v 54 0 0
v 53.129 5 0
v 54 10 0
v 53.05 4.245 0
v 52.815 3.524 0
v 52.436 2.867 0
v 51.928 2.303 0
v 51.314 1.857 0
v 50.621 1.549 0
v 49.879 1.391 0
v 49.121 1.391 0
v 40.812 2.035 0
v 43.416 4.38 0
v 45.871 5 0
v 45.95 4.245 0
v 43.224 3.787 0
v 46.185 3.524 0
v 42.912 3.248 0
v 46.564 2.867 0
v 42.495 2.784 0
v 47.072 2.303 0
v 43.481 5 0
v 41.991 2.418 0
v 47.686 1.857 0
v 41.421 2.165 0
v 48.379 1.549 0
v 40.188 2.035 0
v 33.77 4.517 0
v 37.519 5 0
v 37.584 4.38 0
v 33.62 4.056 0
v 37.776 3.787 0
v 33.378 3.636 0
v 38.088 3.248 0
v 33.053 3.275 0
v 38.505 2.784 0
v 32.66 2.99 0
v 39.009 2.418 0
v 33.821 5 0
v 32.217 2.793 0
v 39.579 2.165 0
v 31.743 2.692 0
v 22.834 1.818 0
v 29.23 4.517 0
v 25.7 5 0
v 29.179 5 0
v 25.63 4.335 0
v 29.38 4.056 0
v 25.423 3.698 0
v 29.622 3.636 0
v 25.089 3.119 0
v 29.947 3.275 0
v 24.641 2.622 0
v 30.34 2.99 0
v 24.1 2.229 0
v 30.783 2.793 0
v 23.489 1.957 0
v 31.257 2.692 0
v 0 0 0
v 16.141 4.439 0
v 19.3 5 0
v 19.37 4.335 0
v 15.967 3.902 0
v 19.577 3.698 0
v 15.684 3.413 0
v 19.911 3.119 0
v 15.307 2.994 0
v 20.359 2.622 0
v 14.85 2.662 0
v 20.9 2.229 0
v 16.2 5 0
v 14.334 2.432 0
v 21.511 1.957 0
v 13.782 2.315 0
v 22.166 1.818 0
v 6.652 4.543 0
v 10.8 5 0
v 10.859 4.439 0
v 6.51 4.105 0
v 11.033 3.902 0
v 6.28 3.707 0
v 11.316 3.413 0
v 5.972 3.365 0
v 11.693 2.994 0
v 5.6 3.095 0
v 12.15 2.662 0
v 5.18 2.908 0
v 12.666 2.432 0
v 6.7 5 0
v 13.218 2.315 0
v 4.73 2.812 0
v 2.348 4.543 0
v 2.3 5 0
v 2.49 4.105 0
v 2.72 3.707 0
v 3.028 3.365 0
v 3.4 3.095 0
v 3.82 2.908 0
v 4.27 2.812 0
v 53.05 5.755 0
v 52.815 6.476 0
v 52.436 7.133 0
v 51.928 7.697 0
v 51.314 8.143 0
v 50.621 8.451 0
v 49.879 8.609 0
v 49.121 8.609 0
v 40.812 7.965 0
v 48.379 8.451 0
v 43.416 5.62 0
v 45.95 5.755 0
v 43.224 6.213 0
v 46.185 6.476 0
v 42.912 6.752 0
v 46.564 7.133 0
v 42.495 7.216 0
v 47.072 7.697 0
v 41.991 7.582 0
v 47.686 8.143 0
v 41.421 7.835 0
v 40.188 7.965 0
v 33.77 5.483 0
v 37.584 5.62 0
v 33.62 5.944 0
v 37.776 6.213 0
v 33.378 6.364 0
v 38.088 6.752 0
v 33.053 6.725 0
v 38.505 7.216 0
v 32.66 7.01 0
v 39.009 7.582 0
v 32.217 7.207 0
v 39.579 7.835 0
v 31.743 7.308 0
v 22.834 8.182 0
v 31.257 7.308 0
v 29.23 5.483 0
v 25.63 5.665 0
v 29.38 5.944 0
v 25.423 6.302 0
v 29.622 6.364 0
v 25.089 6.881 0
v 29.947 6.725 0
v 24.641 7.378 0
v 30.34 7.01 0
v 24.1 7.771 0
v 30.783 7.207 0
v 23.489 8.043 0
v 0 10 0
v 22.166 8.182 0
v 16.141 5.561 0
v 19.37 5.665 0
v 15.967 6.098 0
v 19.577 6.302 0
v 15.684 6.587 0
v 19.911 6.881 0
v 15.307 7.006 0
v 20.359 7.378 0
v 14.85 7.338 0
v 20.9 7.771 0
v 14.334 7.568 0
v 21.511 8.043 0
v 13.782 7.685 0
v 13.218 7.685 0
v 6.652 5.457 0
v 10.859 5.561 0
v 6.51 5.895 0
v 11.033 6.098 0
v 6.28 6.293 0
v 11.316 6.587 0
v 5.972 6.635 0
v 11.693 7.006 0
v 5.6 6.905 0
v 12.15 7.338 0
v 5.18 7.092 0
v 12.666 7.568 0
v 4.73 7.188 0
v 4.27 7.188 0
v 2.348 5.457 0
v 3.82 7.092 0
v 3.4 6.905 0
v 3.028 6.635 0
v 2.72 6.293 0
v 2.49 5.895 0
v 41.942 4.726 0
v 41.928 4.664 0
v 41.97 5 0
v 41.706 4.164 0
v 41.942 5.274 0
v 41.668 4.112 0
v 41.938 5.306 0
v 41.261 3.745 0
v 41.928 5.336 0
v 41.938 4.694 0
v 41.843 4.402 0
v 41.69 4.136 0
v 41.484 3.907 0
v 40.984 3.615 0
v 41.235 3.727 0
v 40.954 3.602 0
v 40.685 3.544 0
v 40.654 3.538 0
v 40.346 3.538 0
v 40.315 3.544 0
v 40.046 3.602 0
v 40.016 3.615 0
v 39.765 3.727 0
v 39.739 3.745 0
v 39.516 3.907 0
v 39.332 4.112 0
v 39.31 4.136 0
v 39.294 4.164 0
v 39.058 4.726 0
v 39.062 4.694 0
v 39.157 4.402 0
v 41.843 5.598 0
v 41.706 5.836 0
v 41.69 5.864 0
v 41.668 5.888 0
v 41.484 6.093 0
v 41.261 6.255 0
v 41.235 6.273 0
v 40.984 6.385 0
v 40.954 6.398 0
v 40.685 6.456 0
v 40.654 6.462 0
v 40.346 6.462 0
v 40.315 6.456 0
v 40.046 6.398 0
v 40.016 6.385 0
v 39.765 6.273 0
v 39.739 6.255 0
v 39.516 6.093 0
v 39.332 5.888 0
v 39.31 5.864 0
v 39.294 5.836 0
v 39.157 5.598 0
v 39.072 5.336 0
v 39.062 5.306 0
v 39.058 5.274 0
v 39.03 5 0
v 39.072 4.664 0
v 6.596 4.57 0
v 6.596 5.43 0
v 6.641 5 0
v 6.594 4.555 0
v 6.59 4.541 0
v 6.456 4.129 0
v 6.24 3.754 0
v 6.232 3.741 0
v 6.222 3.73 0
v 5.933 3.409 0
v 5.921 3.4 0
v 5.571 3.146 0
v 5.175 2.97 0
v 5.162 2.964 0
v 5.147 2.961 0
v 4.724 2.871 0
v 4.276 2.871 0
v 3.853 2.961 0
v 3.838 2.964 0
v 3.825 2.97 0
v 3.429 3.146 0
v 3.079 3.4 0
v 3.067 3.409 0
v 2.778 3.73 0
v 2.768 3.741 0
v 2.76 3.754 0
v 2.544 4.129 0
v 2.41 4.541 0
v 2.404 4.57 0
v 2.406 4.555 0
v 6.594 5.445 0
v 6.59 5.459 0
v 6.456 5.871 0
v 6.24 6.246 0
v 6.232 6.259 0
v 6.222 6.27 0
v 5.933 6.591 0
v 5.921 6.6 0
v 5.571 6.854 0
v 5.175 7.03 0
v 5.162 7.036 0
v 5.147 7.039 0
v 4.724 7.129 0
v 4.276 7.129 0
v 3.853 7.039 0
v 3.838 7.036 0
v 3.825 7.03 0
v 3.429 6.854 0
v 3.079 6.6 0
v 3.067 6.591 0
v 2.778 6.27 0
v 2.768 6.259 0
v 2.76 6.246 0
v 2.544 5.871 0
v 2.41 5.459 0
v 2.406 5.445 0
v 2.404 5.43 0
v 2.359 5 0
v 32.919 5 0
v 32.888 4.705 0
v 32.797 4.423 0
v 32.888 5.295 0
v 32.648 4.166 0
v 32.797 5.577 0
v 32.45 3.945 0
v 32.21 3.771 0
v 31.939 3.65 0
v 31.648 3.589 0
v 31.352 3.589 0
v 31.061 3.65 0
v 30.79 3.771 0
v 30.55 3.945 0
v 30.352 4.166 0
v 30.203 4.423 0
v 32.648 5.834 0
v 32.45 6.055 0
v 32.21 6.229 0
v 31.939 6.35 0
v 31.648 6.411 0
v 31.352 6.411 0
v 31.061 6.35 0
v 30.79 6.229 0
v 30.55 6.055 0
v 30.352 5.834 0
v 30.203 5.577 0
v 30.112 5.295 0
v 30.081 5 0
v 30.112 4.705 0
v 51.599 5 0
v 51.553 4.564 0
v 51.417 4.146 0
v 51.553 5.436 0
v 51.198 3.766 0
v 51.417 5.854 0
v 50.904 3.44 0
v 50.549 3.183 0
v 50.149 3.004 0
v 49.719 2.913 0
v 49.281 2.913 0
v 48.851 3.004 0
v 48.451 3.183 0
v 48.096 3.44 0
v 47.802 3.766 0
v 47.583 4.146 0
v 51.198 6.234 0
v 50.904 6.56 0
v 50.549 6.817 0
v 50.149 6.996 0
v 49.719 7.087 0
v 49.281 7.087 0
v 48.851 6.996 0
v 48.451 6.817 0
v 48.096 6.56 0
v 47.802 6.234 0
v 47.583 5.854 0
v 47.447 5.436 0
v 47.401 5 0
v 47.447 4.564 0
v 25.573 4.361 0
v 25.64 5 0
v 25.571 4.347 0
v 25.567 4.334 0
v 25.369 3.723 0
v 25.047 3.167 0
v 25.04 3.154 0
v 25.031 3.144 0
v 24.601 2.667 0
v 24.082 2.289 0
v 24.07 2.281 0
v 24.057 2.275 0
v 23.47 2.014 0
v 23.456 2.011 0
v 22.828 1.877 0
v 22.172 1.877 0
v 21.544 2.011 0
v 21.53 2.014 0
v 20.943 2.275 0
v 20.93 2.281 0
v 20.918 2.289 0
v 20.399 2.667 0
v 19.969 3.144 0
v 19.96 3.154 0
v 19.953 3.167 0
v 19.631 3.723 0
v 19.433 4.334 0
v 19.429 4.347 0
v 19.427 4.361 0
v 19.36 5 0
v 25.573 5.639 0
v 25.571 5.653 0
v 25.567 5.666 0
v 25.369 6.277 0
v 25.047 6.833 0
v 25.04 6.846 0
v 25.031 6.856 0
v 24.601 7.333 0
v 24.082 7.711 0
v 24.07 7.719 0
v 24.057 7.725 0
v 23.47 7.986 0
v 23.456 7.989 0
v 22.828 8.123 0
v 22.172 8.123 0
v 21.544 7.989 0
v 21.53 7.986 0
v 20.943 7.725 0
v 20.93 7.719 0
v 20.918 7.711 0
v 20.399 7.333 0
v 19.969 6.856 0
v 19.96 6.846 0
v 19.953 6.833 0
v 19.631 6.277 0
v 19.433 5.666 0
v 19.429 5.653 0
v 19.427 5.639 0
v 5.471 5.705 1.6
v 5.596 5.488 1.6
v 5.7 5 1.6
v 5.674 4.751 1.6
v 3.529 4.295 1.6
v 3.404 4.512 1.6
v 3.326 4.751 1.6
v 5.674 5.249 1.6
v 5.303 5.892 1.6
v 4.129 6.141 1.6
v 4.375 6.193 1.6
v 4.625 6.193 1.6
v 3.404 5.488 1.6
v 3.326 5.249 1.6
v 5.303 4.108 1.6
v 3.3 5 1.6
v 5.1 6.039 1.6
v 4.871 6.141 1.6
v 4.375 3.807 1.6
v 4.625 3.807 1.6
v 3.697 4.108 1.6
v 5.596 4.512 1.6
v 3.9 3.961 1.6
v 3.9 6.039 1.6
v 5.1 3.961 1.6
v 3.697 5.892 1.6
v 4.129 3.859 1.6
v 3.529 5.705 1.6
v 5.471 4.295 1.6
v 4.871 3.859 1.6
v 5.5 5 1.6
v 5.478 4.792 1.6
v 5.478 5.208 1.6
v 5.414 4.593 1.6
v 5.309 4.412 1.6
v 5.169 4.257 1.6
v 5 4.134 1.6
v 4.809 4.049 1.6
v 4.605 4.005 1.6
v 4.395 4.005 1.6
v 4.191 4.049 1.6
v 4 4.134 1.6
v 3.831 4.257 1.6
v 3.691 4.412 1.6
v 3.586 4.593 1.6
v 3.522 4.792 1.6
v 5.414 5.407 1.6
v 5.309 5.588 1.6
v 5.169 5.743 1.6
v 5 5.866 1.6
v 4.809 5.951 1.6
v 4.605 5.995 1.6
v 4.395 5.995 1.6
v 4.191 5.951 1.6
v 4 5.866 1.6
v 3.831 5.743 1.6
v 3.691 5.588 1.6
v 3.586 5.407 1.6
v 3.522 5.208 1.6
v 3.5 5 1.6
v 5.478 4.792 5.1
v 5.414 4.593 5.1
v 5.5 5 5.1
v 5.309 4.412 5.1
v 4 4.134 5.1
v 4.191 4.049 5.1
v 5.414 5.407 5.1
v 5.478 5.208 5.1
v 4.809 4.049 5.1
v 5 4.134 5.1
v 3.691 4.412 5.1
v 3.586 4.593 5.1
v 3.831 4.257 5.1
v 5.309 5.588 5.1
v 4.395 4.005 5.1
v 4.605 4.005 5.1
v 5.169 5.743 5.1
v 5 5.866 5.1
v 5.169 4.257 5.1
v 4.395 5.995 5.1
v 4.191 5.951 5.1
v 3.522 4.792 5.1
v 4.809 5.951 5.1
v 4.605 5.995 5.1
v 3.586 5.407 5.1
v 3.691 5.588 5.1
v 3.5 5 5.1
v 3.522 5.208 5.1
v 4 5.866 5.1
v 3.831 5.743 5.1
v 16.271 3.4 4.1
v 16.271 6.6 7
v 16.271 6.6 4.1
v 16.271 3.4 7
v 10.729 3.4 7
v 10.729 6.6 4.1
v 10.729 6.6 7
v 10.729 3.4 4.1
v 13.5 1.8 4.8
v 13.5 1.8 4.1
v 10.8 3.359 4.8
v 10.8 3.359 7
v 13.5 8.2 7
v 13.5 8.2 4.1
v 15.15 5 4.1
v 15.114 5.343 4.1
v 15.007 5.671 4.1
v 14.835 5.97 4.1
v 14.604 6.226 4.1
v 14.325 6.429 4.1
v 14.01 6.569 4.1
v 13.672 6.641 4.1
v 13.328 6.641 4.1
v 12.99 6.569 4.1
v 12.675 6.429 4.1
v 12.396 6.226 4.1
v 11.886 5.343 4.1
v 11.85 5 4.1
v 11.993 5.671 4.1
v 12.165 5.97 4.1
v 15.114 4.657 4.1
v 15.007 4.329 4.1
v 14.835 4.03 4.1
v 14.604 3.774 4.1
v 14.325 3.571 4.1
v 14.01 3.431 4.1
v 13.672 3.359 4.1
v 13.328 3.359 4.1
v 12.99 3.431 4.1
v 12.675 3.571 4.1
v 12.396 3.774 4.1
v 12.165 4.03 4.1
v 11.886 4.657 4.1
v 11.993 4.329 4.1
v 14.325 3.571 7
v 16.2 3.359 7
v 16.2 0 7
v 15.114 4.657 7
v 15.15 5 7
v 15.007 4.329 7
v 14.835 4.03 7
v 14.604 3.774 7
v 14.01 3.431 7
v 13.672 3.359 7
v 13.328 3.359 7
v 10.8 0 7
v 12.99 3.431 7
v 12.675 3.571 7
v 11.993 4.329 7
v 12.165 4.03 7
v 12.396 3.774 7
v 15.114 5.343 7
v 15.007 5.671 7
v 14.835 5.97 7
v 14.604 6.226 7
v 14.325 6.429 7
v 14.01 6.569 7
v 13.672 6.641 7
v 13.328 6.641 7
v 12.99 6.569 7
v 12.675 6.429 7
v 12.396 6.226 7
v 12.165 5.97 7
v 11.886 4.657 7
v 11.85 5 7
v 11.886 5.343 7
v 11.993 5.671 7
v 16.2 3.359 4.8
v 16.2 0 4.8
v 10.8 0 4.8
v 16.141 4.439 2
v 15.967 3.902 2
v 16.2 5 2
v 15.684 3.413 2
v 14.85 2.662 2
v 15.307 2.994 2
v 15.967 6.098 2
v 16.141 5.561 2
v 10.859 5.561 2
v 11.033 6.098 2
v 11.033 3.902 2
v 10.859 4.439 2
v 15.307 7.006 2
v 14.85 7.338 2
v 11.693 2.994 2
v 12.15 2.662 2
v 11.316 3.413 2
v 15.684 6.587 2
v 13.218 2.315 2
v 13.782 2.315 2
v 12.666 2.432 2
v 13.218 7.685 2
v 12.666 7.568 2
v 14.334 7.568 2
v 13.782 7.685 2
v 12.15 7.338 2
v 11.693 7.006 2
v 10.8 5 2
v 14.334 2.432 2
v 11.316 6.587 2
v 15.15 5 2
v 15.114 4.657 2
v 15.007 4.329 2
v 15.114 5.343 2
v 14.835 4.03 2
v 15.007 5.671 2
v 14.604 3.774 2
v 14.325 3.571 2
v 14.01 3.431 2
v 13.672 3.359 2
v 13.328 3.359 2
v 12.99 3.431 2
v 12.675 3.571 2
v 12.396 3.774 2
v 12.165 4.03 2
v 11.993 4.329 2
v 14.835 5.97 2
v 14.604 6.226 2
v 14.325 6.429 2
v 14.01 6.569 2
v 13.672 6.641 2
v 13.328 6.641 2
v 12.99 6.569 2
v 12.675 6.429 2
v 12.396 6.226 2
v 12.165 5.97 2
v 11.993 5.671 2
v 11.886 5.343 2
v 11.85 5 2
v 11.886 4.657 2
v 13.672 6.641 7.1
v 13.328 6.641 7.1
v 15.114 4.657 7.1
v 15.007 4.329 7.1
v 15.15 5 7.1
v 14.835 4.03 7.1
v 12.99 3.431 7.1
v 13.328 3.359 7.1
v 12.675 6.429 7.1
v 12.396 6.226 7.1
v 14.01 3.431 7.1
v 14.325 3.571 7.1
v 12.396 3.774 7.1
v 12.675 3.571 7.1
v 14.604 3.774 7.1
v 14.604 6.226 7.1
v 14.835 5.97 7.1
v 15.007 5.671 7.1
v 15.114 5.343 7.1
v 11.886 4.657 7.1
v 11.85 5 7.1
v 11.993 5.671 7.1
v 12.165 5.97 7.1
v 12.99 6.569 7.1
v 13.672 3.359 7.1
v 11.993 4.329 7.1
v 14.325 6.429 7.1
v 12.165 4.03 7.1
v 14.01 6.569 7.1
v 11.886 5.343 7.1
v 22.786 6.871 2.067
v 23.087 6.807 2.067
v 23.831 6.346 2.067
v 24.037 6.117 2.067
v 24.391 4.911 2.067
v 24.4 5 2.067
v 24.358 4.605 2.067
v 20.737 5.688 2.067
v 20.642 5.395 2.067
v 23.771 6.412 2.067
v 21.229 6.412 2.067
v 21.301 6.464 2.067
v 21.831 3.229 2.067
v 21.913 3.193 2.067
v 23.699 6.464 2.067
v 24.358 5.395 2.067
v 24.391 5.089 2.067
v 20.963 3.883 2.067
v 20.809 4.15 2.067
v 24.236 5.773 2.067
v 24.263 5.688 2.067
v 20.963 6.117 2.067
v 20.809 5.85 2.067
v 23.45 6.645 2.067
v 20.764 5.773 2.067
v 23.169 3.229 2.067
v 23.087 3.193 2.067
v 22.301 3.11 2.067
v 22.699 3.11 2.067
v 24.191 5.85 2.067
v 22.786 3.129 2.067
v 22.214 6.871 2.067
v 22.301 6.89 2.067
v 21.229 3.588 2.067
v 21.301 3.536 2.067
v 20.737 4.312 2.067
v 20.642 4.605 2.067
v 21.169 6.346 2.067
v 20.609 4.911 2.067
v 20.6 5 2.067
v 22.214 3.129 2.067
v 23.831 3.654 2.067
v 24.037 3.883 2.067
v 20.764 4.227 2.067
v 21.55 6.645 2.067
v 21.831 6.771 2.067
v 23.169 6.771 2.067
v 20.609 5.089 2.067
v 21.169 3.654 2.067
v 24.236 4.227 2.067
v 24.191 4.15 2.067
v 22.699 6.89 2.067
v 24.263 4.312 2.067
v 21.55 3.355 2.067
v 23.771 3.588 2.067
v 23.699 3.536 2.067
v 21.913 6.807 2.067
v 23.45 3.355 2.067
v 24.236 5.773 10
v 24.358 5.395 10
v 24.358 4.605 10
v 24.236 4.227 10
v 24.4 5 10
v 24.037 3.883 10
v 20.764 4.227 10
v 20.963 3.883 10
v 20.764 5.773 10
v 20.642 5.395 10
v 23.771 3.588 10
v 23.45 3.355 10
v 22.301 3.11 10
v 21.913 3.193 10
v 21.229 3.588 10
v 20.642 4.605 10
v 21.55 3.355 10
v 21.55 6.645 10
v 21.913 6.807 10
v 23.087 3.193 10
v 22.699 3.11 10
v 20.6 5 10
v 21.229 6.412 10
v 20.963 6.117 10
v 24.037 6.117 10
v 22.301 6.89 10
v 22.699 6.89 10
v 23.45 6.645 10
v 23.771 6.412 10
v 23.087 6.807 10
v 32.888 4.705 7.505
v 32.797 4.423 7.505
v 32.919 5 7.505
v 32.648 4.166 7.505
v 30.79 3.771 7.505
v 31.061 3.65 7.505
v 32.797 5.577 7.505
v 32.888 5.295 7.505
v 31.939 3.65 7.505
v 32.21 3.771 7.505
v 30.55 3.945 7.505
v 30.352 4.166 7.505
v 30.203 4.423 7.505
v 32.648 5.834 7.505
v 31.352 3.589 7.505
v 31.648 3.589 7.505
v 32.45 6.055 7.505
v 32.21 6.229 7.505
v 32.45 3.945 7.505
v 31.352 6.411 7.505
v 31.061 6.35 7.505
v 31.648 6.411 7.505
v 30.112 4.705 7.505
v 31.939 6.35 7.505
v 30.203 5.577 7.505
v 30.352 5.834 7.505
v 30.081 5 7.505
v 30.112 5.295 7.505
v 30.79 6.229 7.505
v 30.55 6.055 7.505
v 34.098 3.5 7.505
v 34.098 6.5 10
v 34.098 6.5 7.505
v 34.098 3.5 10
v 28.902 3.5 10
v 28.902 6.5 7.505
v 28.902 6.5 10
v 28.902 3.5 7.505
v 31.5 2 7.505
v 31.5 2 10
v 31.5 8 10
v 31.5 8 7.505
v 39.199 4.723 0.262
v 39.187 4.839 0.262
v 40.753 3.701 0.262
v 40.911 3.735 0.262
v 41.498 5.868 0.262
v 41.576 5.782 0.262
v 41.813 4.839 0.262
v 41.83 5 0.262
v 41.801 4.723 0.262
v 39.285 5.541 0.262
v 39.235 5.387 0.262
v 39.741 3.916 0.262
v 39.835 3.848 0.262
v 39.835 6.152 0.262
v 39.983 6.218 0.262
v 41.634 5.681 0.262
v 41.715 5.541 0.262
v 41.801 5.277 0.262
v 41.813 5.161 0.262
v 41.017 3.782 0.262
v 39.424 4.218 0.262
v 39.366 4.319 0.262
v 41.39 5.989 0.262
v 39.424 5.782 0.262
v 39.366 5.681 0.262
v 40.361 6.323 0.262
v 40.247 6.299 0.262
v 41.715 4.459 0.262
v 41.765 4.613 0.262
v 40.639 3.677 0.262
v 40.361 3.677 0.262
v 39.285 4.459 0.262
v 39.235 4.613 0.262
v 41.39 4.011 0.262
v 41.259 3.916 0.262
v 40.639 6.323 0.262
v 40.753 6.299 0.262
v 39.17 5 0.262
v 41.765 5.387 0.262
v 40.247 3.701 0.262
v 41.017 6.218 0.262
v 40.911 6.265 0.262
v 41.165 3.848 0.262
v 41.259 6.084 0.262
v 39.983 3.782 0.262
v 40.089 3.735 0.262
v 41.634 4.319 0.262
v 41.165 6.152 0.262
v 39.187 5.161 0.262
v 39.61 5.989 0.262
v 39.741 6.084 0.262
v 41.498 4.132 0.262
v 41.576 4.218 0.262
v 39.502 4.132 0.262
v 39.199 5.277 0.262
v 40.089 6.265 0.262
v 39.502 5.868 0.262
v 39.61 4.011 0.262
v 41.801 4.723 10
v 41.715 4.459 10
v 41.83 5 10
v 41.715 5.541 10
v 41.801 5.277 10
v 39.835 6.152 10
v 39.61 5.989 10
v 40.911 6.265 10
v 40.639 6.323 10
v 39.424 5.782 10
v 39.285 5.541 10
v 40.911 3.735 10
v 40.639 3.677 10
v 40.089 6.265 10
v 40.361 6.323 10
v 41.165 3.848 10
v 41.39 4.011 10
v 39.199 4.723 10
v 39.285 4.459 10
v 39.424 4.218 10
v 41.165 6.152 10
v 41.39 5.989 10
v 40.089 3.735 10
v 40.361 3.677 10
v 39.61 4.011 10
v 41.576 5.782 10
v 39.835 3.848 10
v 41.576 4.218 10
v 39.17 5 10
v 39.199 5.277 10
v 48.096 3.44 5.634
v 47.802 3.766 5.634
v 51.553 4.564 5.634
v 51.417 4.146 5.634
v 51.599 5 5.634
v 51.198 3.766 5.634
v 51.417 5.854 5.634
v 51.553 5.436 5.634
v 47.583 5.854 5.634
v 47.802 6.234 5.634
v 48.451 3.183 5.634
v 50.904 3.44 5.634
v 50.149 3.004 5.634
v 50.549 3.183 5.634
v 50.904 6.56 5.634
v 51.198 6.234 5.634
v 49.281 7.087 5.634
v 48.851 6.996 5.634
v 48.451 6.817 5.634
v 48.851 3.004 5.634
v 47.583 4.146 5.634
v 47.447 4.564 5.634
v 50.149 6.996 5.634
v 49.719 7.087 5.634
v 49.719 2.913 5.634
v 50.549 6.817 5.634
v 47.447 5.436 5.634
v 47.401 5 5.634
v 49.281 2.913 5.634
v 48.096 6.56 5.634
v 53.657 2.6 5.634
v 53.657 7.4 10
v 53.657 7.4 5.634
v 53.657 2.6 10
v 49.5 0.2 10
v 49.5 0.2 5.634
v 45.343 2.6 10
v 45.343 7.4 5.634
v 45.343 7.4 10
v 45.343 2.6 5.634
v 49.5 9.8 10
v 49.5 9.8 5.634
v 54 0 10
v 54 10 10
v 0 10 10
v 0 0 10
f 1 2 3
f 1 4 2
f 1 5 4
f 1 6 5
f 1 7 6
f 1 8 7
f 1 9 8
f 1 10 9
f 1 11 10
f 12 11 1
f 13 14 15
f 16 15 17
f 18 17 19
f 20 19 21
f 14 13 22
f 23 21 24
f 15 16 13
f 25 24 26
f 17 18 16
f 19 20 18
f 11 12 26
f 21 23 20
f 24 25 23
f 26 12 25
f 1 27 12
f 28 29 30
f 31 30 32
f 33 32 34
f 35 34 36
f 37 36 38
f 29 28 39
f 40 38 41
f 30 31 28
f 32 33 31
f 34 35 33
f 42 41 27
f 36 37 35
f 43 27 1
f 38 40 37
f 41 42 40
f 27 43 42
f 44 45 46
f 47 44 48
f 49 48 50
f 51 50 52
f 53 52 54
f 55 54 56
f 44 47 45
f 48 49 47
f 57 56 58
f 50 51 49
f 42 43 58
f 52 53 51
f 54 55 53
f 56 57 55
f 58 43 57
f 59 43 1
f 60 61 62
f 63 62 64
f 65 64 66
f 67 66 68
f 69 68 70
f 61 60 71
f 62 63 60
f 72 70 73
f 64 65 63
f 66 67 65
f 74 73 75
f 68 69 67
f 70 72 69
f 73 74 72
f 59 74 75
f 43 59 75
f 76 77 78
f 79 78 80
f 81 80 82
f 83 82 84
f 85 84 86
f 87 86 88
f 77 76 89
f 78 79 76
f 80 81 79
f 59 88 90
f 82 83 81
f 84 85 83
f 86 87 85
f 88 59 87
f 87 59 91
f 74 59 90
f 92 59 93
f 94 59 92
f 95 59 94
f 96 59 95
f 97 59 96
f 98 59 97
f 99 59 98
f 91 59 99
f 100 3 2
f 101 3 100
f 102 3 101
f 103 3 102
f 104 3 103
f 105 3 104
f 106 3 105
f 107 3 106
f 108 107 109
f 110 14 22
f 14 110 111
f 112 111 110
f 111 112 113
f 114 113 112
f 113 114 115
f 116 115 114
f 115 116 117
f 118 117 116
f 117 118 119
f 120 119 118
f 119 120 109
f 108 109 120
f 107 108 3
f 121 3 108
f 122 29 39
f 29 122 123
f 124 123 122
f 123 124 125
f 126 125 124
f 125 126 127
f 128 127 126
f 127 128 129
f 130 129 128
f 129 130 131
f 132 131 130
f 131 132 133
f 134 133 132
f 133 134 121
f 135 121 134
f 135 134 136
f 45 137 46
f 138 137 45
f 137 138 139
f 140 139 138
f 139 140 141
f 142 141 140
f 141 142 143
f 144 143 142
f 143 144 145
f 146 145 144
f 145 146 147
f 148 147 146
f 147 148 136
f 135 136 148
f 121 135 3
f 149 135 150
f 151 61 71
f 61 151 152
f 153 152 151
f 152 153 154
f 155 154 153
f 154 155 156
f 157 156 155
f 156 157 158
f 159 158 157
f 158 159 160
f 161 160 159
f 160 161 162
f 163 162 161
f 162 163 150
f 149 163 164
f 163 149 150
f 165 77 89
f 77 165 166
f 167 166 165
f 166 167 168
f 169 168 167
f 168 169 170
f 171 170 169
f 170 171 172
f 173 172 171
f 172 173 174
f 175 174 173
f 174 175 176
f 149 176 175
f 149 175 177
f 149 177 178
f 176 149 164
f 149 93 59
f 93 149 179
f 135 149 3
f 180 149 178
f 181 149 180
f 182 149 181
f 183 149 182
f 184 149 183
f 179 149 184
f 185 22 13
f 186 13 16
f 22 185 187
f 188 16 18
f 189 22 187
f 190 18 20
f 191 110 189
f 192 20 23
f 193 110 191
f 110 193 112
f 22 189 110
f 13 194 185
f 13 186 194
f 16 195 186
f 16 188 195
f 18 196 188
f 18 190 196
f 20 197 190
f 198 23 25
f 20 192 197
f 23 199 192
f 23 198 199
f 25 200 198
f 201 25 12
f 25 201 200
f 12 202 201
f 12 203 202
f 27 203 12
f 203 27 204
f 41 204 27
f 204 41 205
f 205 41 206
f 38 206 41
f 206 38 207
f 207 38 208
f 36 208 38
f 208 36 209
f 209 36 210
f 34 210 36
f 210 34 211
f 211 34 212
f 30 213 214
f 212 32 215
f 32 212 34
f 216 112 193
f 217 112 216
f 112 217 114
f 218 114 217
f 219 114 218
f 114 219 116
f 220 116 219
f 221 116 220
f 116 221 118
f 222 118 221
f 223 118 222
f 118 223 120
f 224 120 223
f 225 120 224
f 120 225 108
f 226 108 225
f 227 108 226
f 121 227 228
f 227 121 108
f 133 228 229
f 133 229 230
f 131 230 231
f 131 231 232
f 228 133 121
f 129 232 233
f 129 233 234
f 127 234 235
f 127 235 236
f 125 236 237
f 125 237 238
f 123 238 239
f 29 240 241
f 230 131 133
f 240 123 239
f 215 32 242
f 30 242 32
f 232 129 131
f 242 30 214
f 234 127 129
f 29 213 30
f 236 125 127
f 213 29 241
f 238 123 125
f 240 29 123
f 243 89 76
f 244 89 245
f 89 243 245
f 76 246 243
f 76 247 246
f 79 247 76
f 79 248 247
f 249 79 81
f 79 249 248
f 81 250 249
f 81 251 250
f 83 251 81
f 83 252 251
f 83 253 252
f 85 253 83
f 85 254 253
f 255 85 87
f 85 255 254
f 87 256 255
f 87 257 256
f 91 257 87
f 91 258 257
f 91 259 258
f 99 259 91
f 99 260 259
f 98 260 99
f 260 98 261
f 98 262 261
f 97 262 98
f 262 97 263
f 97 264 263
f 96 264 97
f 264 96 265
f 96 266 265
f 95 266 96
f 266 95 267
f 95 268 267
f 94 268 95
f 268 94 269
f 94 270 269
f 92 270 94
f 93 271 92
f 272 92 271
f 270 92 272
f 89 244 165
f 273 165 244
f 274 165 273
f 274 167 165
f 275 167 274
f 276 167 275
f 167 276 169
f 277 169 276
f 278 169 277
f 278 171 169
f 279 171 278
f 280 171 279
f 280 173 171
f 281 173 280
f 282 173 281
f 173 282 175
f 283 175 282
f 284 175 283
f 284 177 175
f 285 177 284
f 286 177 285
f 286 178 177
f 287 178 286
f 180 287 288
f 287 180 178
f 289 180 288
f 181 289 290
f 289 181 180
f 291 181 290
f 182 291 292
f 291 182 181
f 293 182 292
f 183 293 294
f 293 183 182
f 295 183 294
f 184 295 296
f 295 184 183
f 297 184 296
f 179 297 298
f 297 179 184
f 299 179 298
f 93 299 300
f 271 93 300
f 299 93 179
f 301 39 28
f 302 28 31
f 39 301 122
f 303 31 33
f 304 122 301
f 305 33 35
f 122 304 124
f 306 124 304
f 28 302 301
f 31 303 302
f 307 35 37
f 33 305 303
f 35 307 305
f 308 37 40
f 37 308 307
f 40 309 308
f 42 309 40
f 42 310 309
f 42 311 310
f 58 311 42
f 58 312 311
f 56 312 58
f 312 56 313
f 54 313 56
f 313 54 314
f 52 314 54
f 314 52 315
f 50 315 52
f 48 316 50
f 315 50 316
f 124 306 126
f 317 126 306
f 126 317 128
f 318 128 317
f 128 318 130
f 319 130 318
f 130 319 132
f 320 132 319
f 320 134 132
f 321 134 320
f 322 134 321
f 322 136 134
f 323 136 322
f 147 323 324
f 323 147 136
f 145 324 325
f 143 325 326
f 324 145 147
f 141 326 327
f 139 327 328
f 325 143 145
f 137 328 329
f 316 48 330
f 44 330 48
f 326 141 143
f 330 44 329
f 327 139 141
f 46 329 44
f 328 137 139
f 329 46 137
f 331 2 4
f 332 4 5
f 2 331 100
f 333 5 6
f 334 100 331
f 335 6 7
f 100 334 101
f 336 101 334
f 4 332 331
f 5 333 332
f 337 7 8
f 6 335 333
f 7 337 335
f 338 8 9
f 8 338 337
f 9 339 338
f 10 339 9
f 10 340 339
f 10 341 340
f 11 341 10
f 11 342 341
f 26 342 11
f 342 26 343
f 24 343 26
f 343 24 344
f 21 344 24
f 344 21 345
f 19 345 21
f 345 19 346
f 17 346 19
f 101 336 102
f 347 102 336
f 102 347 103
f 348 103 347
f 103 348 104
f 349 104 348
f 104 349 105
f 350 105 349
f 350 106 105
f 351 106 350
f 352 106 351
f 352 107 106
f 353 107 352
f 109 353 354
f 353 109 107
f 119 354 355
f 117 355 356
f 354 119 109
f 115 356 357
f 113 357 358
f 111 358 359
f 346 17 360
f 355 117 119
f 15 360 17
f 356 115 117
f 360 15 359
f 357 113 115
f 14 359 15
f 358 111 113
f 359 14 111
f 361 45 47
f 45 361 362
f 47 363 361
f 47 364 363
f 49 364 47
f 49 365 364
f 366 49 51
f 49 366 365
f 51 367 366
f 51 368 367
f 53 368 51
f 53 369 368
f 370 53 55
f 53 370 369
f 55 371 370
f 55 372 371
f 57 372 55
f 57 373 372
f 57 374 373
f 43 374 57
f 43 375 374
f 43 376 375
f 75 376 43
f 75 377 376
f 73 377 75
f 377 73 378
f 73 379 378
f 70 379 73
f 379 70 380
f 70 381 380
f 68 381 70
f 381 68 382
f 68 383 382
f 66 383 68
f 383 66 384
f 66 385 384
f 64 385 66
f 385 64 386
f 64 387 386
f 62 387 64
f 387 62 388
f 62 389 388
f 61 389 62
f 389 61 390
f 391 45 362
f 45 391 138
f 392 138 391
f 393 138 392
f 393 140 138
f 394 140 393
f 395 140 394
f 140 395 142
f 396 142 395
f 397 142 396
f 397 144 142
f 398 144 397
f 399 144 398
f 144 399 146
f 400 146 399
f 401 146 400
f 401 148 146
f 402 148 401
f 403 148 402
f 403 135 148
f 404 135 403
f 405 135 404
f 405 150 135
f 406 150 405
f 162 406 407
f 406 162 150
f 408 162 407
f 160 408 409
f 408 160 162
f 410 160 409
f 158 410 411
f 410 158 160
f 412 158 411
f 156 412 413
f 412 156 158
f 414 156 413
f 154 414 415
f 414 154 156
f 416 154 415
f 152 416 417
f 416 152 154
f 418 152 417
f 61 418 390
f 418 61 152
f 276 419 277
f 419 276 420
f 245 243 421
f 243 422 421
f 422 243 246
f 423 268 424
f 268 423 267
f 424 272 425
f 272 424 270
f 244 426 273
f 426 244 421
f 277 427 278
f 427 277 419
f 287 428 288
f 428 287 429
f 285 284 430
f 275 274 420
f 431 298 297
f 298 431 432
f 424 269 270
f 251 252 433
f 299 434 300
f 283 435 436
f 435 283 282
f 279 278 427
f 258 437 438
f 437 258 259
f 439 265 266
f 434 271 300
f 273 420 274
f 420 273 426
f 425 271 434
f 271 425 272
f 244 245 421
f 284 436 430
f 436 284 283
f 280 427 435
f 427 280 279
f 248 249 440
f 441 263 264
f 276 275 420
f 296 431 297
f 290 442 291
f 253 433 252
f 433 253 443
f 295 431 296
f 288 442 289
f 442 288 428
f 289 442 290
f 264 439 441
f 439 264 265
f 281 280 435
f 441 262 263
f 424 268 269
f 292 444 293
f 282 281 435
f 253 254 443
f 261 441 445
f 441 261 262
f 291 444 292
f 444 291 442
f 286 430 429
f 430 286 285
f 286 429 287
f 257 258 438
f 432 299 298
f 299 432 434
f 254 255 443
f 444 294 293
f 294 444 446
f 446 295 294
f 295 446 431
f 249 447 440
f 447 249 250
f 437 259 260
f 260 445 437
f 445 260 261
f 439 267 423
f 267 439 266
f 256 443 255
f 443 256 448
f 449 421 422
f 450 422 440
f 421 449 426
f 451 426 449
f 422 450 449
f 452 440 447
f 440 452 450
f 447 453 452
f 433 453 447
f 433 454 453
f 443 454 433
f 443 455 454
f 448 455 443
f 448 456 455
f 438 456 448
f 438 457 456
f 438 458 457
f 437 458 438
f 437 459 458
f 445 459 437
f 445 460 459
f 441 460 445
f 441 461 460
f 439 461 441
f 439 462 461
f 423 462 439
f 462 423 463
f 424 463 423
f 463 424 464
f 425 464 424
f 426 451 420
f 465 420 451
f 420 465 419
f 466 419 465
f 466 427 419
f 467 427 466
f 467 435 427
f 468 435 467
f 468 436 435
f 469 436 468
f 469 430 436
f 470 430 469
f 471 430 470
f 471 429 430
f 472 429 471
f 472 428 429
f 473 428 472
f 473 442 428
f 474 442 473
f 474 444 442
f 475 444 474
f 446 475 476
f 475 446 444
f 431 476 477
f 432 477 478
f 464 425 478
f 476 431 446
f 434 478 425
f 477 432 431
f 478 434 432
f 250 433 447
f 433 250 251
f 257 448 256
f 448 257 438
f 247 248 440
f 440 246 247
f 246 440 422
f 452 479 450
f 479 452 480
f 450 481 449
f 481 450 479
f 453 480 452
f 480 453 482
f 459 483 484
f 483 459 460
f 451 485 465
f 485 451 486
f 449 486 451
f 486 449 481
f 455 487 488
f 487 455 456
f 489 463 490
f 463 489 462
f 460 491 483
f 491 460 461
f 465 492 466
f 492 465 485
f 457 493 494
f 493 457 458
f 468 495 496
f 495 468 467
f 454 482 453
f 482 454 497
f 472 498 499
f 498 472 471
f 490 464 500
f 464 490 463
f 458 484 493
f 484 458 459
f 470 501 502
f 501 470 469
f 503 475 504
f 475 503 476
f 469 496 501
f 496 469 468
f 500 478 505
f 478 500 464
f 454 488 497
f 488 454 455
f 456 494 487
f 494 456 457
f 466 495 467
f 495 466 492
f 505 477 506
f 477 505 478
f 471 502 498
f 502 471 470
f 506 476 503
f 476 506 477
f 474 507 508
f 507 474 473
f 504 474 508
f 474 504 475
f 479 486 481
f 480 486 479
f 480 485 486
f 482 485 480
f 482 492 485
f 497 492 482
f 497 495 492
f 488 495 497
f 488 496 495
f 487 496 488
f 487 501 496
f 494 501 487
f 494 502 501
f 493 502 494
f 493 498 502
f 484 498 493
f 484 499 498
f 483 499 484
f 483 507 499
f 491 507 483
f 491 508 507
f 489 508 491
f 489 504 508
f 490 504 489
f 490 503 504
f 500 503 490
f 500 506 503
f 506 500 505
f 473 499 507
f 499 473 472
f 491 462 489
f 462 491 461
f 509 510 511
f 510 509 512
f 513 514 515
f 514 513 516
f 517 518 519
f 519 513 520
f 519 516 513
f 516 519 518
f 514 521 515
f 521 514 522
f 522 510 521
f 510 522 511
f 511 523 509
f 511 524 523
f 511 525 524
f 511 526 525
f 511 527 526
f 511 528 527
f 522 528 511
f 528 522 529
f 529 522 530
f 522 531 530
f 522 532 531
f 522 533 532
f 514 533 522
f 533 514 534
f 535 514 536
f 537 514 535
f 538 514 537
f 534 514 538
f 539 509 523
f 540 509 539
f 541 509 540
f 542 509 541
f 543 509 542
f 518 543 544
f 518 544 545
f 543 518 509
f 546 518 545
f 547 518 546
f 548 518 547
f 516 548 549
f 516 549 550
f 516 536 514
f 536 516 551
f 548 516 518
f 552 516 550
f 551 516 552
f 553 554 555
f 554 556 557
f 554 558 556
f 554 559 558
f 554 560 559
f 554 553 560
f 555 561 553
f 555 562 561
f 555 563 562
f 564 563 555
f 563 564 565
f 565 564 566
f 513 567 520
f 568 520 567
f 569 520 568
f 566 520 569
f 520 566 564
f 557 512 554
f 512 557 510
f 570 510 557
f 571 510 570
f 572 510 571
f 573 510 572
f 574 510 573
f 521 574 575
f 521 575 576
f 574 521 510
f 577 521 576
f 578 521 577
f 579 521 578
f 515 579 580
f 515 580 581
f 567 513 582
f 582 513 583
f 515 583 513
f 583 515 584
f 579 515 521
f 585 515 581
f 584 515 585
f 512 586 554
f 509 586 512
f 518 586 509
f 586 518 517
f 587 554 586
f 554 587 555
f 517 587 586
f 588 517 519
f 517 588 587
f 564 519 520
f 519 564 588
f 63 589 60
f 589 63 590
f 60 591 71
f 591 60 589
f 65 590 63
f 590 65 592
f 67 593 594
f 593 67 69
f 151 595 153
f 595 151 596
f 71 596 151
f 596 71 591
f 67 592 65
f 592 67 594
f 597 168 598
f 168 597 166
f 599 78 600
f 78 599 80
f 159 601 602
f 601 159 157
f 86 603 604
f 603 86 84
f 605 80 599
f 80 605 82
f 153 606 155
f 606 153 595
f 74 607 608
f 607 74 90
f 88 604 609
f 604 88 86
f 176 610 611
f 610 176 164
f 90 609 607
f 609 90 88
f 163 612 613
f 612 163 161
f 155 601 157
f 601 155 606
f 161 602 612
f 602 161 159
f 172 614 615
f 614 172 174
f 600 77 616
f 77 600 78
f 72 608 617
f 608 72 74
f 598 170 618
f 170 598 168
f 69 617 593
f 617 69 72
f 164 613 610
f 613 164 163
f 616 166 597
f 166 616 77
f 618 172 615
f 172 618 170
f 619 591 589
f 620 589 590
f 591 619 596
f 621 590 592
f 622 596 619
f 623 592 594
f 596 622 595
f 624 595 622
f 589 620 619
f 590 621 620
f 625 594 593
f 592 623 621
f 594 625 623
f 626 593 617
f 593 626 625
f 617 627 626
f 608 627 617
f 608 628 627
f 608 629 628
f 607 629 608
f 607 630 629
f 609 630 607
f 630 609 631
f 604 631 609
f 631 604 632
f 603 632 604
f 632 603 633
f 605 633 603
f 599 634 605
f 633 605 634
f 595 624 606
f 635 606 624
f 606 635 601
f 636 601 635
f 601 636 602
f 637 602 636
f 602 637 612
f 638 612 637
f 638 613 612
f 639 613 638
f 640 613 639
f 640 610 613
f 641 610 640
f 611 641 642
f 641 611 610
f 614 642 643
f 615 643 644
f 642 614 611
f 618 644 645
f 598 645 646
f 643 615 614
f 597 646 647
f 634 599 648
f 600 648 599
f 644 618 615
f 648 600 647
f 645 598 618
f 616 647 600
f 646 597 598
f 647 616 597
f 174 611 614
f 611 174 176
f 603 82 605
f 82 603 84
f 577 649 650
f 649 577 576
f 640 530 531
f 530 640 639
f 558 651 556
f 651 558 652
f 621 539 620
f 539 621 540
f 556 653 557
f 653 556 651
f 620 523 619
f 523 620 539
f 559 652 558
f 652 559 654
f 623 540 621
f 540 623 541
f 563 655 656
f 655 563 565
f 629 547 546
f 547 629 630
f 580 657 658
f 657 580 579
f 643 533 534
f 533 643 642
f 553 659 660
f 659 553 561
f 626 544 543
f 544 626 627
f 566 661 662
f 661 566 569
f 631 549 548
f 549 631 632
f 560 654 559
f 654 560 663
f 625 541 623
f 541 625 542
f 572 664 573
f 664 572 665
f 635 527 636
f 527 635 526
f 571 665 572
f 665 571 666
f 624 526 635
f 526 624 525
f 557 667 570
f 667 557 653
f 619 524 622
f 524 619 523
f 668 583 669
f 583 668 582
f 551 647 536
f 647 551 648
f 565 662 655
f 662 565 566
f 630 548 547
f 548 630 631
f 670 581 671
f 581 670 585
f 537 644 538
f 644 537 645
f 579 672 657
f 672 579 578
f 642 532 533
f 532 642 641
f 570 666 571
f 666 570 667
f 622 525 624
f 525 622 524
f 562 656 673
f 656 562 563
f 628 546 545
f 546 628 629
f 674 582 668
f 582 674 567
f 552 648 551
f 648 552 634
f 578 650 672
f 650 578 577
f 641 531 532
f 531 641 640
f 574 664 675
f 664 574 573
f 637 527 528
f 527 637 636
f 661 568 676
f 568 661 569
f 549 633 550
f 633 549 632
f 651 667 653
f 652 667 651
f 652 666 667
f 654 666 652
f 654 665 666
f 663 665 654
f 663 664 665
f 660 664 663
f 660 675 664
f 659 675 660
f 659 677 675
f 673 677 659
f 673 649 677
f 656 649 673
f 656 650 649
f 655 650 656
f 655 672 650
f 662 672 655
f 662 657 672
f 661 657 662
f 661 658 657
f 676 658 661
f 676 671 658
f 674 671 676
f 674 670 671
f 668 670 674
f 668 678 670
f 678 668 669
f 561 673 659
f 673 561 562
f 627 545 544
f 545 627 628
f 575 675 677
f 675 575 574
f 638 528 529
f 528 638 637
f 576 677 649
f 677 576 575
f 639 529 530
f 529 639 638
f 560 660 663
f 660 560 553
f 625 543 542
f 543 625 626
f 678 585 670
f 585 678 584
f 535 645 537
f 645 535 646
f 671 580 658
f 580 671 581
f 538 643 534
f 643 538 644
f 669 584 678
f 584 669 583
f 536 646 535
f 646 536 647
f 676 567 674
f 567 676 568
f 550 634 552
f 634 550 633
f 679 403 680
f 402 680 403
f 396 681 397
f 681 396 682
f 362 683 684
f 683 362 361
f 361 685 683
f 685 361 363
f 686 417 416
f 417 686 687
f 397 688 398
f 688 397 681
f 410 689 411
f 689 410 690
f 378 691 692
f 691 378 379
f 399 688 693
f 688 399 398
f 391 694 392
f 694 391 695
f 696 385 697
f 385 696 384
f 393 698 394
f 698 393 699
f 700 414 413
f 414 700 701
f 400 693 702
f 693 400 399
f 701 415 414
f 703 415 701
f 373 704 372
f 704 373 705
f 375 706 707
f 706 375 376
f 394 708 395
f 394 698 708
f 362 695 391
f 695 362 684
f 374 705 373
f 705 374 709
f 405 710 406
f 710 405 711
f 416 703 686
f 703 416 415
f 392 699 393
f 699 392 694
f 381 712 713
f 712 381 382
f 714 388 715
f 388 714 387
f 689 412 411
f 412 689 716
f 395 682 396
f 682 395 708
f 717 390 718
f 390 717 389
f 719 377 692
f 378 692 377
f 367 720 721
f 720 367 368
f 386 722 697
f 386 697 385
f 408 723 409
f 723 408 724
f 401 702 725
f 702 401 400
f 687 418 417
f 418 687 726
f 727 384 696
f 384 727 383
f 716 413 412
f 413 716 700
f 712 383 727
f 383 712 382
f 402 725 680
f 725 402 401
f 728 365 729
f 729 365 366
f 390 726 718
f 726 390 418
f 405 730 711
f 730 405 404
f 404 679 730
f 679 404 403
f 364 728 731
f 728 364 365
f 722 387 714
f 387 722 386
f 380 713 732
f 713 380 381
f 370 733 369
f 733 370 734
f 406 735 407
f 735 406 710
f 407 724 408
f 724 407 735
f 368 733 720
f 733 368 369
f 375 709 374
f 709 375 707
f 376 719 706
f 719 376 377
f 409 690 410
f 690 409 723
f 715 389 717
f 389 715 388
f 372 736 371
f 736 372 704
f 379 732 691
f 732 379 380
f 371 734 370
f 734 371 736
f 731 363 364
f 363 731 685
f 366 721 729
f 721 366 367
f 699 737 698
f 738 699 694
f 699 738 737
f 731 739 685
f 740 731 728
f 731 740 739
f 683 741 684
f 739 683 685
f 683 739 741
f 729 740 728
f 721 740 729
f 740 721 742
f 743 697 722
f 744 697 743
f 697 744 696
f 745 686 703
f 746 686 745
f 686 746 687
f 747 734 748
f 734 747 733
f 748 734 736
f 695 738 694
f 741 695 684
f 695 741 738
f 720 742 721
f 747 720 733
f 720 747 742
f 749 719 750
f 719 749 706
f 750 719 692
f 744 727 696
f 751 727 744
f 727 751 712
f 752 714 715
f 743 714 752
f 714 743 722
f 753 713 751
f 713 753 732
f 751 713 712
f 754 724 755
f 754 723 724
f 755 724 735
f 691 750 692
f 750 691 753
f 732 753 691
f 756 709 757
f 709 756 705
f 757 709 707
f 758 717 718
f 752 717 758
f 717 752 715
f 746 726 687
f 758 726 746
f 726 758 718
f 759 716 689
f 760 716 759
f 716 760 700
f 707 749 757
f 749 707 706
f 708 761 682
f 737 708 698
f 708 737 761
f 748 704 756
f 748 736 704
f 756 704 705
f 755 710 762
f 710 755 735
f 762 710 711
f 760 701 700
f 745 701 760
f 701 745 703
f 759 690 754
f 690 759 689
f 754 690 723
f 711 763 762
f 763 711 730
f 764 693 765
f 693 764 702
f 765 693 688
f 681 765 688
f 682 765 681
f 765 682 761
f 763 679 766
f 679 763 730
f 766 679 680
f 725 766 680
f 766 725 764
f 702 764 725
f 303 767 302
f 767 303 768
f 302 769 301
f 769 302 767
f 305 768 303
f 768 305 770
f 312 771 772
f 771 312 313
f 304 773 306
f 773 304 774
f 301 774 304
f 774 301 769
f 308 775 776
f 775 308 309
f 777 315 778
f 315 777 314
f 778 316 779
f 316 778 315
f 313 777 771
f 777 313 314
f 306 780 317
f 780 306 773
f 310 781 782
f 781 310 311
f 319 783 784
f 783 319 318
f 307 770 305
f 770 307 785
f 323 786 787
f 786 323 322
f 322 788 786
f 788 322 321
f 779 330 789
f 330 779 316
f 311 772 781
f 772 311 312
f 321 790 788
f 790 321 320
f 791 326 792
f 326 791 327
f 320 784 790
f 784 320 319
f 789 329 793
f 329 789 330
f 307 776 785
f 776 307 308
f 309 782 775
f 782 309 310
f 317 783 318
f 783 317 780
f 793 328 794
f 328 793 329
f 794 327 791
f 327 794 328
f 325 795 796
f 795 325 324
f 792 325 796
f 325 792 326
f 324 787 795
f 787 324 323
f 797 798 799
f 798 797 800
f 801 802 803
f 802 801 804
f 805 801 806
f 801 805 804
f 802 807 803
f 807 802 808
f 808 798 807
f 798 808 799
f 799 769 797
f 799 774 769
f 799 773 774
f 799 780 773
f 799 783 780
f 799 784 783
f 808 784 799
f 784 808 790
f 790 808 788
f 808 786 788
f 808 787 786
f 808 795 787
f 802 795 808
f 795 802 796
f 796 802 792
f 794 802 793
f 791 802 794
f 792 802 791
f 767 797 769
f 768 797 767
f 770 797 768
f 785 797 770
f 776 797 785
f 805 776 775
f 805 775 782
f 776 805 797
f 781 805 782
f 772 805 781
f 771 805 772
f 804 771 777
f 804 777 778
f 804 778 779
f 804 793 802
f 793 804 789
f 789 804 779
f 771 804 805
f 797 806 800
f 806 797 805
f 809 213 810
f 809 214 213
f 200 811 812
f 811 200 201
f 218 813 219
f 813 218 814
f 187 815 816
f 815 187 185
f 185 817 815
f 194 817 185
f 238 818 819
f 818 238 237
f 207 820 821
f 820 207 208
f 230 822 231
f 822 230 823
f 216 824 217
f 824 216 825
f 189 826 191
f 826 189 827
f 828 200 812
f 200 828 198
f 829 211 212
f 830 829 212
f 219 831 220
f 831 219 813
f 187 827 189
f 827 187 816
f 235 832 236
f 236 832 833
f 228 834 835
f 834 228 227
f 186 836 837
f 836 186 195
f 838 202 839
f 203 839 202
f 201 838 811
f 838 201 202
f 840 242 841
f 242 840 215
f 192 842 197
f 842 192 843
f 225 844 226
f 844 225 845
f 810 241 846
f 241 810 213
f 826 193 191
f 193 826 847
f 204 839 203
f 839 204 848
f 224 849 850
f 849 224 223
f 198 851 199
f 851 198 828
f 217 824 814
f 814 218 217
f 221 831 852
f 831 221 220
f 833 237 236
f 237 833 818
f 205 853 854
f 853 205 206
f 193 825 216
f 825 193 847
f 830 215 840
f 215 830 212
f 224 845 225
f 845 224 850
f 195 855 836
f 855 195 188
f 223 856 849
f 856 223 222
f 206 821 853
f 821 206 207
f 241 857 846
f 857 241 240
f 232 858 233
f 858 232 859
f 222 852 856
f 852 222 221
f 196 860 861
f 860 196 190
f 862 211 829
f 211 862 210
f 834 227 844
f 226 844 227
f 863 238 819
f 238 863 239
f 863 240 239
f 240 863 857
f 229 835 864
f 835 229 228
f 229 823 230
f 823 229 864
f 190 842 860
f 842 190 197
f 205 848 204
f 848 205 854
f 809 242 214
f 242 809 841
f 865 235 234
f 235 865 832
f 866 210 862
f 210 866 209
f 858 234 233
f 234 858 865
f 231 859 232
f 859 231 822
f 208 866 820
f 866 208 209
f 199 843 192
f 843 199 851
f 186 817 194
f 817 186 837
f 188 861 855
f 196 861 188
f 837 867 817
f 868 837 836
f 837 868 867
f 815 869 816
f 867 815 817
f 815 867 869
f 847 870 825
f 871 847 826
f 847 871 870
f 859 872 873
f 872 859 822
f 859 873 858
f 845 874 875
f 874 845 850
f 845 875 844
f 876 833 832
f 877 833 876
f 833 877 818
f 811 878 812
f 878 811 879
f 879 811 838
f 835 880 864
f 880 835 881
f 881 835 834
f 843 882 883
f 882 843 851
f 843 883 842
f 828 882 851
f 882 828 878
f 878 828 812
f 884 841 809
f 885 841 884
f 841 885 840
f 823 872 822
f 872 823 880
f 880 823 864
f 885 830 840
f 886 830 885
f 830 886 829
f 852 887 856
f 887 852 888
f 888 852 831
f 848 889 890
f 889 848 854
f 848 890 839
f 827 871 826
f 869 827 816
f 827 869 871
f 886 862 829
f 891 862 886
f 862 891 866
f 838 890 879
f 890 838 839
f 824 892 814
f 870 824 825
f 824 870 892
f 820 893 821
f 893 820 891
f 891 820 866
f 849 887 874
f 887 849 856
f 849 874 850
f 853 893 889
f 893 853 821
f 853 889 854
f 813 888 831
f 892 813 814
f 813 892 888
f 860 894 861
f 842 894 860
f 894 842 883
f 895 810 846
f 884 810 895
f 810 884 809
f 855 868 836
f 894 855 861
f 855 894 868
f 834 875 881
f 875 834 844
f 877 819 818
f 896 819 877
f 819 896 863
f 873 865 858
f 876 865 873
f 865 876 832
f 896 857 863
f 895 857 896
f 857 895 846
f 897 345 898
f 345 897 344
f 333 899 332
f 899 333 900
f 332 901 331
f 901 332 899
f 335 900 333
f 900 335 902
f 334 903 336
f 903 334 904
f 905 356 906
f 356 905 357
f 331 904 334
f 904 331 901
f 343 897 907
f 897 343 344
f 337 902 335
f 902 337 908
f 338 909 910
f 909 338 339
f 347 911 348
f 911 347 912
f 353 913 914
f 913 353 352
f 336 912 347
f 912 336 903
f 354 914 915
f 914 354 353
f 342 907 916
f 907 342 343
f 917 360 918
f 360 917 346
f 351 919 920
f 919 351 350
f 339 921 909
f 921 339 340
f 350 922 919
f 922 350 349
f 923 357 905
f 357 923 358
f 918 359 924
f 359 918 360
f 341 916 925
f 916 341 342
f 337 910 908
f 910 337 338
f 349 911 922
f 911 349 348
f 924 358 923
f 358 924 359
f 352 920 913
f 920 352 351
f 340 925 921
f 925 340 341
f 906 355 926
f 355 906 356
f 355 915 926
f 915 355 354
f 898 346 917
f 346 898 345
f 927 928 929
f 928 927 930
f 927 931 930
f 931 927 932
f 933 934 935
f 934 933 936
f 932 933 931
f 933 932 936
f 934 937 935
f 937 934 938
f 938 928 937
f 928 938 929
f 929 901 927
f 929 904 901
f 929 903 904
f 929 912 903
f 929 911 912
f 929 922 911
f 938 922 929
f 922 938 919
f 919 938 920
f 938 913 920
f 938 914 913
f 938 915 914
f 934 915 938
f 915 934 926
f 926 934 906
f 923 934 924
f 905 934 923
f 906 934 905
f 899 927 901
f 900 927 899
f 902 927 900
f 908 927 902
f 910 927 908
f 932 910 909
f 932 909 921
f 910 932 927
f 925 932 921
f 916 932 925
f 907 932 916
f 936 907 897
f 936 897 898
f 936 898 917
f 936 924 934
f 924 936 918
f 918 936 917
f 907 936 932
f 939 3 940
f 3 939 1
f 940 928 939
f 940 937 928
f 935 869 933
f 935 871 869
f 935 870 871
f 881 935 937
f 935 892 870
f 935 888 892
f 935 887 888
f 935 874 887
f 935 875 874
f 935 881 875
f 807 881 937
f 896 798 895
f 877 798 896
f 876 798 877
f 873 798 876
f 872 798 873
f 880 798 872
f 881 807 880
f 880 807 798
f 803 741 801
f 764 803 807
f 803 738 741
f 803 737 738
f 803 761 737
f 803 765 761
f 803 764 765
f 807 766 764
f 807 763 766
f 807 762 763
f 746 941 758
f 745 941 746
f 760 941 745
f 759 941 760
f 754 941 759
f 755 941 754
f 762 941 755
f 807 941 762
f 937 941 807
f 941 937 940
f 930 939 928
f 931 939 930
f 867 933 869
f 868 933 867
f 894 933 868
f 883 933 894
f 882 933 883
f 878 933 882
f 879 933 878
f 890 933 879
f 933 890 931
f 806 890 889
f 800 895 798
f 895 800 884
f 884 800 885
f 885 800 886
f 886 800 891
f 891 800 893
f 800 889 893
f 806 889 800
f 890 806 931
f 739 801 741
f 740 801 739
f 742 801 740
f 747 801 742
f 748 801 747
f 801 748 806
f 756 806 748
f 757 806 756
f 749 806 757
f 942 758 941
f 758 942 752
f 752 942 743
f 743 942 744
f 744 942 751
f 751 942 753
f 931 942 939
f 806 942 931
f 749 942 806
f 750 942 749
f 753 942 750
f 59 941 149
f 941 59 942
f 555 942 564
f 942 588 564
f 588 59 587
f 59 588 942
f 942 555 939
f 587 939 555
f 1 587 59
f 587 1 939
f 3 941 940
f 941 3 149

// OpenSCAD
// file: aidutil.scad
// Utility functions for OpenSCAD
// Adrian McCarthy 2021

// These interfaces may change.  No promises.

// GENERAL PURPOSE FUNCTIONS

// Just an alias for OpenSCAD's norm.
function magnitude(v) = norm(v);

function mid(a, b) = a + 0.5*(b - a);

// Returns a unit length vector in the same direction.
function normalized(v) =
    let(length = magnitude(v))
        (length != 0) ? 1/length * v : 0 * v;

// Rounds n to a multiple of base.
function round_up(n, base=1) =
    n % base == 0 ? n : floor((n+base)/base)*base;

// TABLE LOOKUP FUNCTIONS
    
function find_row(key, table, low, high) =
  low > high ? undef :
  let(i = round_up(mid(low, high)))
    table[i][0] == key ? table[i] :
    table[i][0] <  key ? find_row(key, table, i+1, high) :
                         find_row(key, table, low, i-1);

function find_params(key, table) =
    find_row(key, table, 0, len(table) - 1);

function remap_key(key, mapping) =
    let(mapped = find_params(key, mapping))
        is_undef(mapped) ? key : mapped[1];

// 2D FUNCTIONS

// Returns coefficients (A, B, C) to represent the line from pt0 to pt1
// in the form Ax + By + C = 0.  (XY plane only!)
function line_coeffs(pt0, pt1) =
    let (rise=pt1.y - pt0.y, run=pt1.x - pt0.x,
         A=rise, B=-run, C=-A*pt0.x - B*pt0.y)
    [A, B, C];

// Returns the distance between a 2D point and a line in (A, B, C) form.
function point_to_line(point, line) =
    abs(line[0]*point.x + line[1]*point.y + line[2]) /
    sqrt(line[0]*line[0] + line[1]*line[1]);

// ROUNDED POLYGONS
// Define a 2D polygon with (x, y, radius) vertices and get a rounded version.

// Add a default radius to all points.
function set_radii(points, r) = [ for (i=points) [i.x, i.y, r] ];

// Returns a copy of just the (x, y) components of an (x, y, radius) list.
// This is useful for rendering the original polygon without rounding, since
// OpenSCAD's polygon won't ignore the third component.
function clear_radii(points)  = [ for (i=points) [i.x, i.y] ];

function remove_adjacent_duplicates(points) = [
    points[0],
    each [for (i = [1:len(points)-2]) if (points[i] != points[i-1]) points[i]],
    each [for (i = len(points)-1) if (points[i] != points[0]) points[i]]
];

// Returns a copy of the vector with additional points mirroring the original
// ones reflected in x.
function mirror_path(points) =
    remove_adjacent_duplicates([
        each points,
        each [ for (j=[1:len(points)]) let(i=len(points)-j)
                   [-points[i].x, points[i].y, points[i][2]] ]
    ]);

// Returns a copy of the vector with a duplicate of the last point at the
// beginning and the first point at the end.  This simplifies indexing the
// previous and next point.
function wrap_path(points) =
    [points[len(points) - 1], each points, points[0]];

// Projects point p to the surface of a circle (or sphere).
function push_to_circumference(p, focus, radius) =
    focus + normalized(p - focus)*radius;

// Recursively generates points on an arc from p1 to p2.  A depth limit avoids
// runaway recursion.  It also stops subdividing once the $fs facet size is
// reached.  Currently, it does not check $fa or $fn.
function arc(focus, r, p1, p2, depth=0) =
    depth >= 8 ? [] :  // prevent runaway recursion
    magnitude(p1-p2) <= $fs ? [] :
        let (midpoint = push_to_circumference(mid(p1, p2), focus, r)) [
            each arc(focus, r, p1, midpoint, depth=depth+1),
            midpoint,
            each arc(focus, r, midpoint, p2, depth=depth+1)
        ];

// Given a polygon in (x, y, radius) form, it computes the parameters necessary
// to generate the arcs to round off the corners.
function compute_arcs(points) =
    let (path = wrap_path(points)) [
        for (i = [1:len(path)-2])
            let (
                A = [path[i-1].x, path[i-1].y],  // adjacent vertex
                B = [path[i].x, path[i].y],      // current vertex
                C = [path[i+1].x, path[i+1].y],  // adjacent vertex
                r = is_undef(path[i][2]) ? 0 : path[i][2], // radius of arc

                // Ahat and Chat are unit vectors pointing from B toward
                // vertices A and C, respectively.
                Ahat = normalized(A - B),
                Chat = normalized(C - B),
        
                // Fhat points from B, bisecting the angle formed by AB and CB.
                Fhat = normalized(Ahat + Chat),

                // Theta is the half-angle between the sides meeting at B.
                // The dot product of unit vectors is equal to the cosine of
                // the angle between them.
                costheta = Fhat*Ahat,
                sintheta = sqrt(1 - costheta*costheta),

                // Compute F, the focus (center) of the circle needed to make
                // the arc.
                offset = r / sintheta,
                F = B + offset*Fhat,
                
                // Aprime and Cprime are the points at which the corresponding
                // sides of the polygon are tangent to a circle of radius r at F.
                Aprime = B + offset*costheta*Ahat, // endpoints of the arc
                Cprime = B + offset*costheta*Chat
            )
            [ F, r, Aprime, Cprime ]
    ];

// Given a list of (x, y, radius) points, this returns a corrsponding list of
// (x, y) points that represent the rounded version of the polygon.  The
// result can be passed directly to OpenSCAD's polygon.
function rounded_polygon(points) = [
    for (a = compute_arcs(points))
        let (F = a[0], r = a[1], Aprime = a[2], Cprime = a[3])
            each [ Aprime, each arc(F, r, Aprime, Cprime), Cprime]
];
// main file
// All kinds of bolt and machine screw holes                                   |
// Adrian McCarthy 2021

use <aidutil.scad>;

function thou(x) = x*0.0254;
function inch(x) = x*25.4;
function tpi(x)  = inch(1/x);

// The bolt table provides parameters about the bolts (screws).  The rows
// must be sorted by the first entry (ASCIIbetical).
//
// Each row of a bolt table row consists of:
//  [0] name (e.g., "M2", "#4-40", or "1/4-20")
//  [1] free-fit clearance hole diameter
//  [2] close-fit clearance hole diameter
//  [3] tapping hole diameter
//  [4] thread pitch
//  [5] maximum head diameter
//  [6] head height
//  [7] flat head diameter
//  [8] flat head height
//  [9] maximum nut width (edge to edge, wrench size)
//  [10] maximum nut thickness (along the bolt axis)

// This default table provides parameters for common metric and inch machine
// screws, but you can substitute your own table if it conforms to the
// description above.
machine_screws = [
    // name     free-fit    close-fit   tapping     pitch       head_d      head_h      flat_d      flat_h      nut_w       nut_th
    ["#2-56",   thou( 96),  thou( 89),  thou( 70),  tpi(56),    thou(167),  thou( 63),  thou(162),  thou( 51),  inch(3/16), inch(1/16)],
    ["#4-40",   thou(120),  thou(116),  thou( 89),  tpi(40),    thou(219),  thou( 80),  thou(212),  thou( 67),  inch(1/4),  inch(3/32)],
    ["#6-32",   thou(149.5),thou(144),  thou(106.5),tpi(32),    thou(270),  thou( 97),  thou(262),  thou( 83),  inch(5/16), inch(7/64)],
    ["1/4-20",  thou(266),  thou(257),  thou(201),  tpi(20),    thou(492),  thou(175),  thou(477),  thou(153),  inch(7/16), inch(3/16)],
    ["M2",      2.4,        2.4,        1.6,        0.40,       4.0,        1.6,        3.8,        1.20,       4.0,        1.6       ],
    ["M2.5",    2.9,        2.8,        2.1,        0.45,       5.0,        2.0,        4.7,        1.50,       5.0,        2.0       ],
    ["M3",      3.4,        3.4,        2.5,        0.50,       6.0,        2.4,        5.6,        1.65,       5.5,        2.4       ],
    ["M4",      4.5,        4.3,        3.5,        0.70,       8.0,        3.1,        7.5,        2.20,       7.0,        3.2       ]
];

function find_bolt_params(size, table) = find_params(size, table=table);

module bolt_hole(size, l, threads="none", head="proud", table=machine_screws, nozzle_d=0.4) {
    bolt = find_bolt_params(size, table=table);
    if (is_undef(bolt)) {
        echo(str("bolt_hole: `size` \"", size, "\" not found in table"));
        assert(false, "bolt_hole: cannot continue without `size`");
    }

    // Name the bolt parameters.
    free_d  = bolt[1];
    close_d = bolt[2];
    tap_d   = bolt[3];
    pitch   = bolt[4];
    head_d  = bolt[5];
    head_h  = bolt[6];
    flat_d  = bolt[7];
    flat_h  = bolt[8];
    nut_w   = bolt[9];
    nut_th  = bolt[10];

    thread_types = [  //        shaft_d hexnut  pocket
        ["none",                free_d, false,  false],
        ["pocket hex nut",      free_d, true,   true],
        ["recessed hex nut",    free_d, true,   false],
        ["self-tapping",        tap_d,  false,  false]
    ];
    thread_synonyms = [
        ["",                "none"],
        ["pilot",           "self-tapping"],
        ["pocket nut",      "pocket hex nut"],
        ["recessed nut",    "recessed hex nut"],
        ["self tapping",    "self-tapping"],
        ["tapped",          "self-tapping"]
    ];

    thread_type = find_params(remap_key(threads, thread_synonyms), table=thread_types);
    if (is_undef(thread_type)) {
        echo(str("bolt_hole: `threads` type \"", threads, "\" not recognized"));
        echo(str("expected one of: ", [for (i=thread_types) i[0]]));
        assert(false);
    }

    shaft_d = thread_type[1];
    hexnut  = thread_type[2];
    pocket  = thread_type[3];

    head_types = [  //      drop    taper    
        ["counterbored",    head_h, false],
        ["countersunk",     0,      true ],
        ["proud",           0,      false]
    ];
    
    head_type = find_params(head, table=head_types);
    if (is_undef(head_type)) {
        echo(str("bolt_hole: `head` type \"", head, "\" not recognized"));
        echo(str("expected one of: ", [for (i=thread_types) i[0]]));
        assert(false);
    }

    drop    = head_type[1];
    taper   = head_type[2];
    bevel   = !taper && shaft_d == tap_d && l > 4*pitch;

    union() translate([0, 0, -drop]) {
        $fs = nozzle_d/2;

        // The head of the screw.
        cylinder(h=head_h + drop, d=head_d + nozzle_d);
        
        if (bevel) {
            // Add a tiny bevel to guide the tap (or self-tapping screw) toward
            // the center of the bore.
            translate([0, 0, -pitch])
                cylinder(h=pitch+0.1, d1=shaft_d, d2=free_d);
        }
        
        if (taper) {
            // This forms the countersink for a flathead screw.
            translate([0, 0, -head_h])
                cylinder(h=head_h + 0.1, d1=close_d, d2=head_d + nozzle_d);
        }

        // The shaft of the screw.
        translate([0, 0, -l - 0.1]) cylinder(h=l + 0.2, d=shaft_d + nozzle_d);
    
        if (hexnut) {
            // Recess or pocket for a hex nut.
            nut_d = round_up(nut_w / cos(30), nozzle_d) + nozzle_d;
            protrusion = 2*pitch;
            h = nut_th + protrusion + (pocket ? 0 : 0.1);
            depth = -l - (pocket ? 0 : 0.1);
            translate([0, 0, depth]) {
                rotate([0, 0, 90]) cylinder(h=h, d=nut_d, $fn=6);
                if (pocket) {
                    pocket_w = nut_w + nozzle_d;
                    translate([-pocket_w/2, 0, 0])
                        cube([pocket_w, 1.5*nut_d, nut_th+nozzle_d/2]);
                }
            }
        }
    }
}

// This test shows a cutaway view of several example bolt holes.
module test() {
    spacing = 9;
    i = [spacing, 0, 0];
    depth = 10;
    w = 6*spacing;
    h = 10;
    
    translate([0, $preview ? 0: depth, $preview ? 0 : h])
    rotate([$preview ? 0 : 180, 0, 0])
    difference() {
        cube([w, depth, h]);
        if ($preview) {
            // cutaway
            translate([-1, -depth/2-0.5, -1]) cube([w+2, spacing, h+2]);
        }
        translate([-spacing/2, depth/2, 10]) {
            translate(1*i) bolt_hole("M2", h/2, "self-tapping", "countersunk");
            translate(2*i) bolt_hole("M2.5", h/2, "pocket hex nut", "counterbored");
            translate(3*i) bolt_hole("M3", h, head="countersunk");
            translate(4*i) bolt_hole("#2-56", h, "recessed hex nut");
            translate(5*i) bolt_hole("#4-40", h, "self-tapping");
            translate(6*i) bolt_hole("#6-32", h, "recessed hex nut");
        }
    }
}

test();
